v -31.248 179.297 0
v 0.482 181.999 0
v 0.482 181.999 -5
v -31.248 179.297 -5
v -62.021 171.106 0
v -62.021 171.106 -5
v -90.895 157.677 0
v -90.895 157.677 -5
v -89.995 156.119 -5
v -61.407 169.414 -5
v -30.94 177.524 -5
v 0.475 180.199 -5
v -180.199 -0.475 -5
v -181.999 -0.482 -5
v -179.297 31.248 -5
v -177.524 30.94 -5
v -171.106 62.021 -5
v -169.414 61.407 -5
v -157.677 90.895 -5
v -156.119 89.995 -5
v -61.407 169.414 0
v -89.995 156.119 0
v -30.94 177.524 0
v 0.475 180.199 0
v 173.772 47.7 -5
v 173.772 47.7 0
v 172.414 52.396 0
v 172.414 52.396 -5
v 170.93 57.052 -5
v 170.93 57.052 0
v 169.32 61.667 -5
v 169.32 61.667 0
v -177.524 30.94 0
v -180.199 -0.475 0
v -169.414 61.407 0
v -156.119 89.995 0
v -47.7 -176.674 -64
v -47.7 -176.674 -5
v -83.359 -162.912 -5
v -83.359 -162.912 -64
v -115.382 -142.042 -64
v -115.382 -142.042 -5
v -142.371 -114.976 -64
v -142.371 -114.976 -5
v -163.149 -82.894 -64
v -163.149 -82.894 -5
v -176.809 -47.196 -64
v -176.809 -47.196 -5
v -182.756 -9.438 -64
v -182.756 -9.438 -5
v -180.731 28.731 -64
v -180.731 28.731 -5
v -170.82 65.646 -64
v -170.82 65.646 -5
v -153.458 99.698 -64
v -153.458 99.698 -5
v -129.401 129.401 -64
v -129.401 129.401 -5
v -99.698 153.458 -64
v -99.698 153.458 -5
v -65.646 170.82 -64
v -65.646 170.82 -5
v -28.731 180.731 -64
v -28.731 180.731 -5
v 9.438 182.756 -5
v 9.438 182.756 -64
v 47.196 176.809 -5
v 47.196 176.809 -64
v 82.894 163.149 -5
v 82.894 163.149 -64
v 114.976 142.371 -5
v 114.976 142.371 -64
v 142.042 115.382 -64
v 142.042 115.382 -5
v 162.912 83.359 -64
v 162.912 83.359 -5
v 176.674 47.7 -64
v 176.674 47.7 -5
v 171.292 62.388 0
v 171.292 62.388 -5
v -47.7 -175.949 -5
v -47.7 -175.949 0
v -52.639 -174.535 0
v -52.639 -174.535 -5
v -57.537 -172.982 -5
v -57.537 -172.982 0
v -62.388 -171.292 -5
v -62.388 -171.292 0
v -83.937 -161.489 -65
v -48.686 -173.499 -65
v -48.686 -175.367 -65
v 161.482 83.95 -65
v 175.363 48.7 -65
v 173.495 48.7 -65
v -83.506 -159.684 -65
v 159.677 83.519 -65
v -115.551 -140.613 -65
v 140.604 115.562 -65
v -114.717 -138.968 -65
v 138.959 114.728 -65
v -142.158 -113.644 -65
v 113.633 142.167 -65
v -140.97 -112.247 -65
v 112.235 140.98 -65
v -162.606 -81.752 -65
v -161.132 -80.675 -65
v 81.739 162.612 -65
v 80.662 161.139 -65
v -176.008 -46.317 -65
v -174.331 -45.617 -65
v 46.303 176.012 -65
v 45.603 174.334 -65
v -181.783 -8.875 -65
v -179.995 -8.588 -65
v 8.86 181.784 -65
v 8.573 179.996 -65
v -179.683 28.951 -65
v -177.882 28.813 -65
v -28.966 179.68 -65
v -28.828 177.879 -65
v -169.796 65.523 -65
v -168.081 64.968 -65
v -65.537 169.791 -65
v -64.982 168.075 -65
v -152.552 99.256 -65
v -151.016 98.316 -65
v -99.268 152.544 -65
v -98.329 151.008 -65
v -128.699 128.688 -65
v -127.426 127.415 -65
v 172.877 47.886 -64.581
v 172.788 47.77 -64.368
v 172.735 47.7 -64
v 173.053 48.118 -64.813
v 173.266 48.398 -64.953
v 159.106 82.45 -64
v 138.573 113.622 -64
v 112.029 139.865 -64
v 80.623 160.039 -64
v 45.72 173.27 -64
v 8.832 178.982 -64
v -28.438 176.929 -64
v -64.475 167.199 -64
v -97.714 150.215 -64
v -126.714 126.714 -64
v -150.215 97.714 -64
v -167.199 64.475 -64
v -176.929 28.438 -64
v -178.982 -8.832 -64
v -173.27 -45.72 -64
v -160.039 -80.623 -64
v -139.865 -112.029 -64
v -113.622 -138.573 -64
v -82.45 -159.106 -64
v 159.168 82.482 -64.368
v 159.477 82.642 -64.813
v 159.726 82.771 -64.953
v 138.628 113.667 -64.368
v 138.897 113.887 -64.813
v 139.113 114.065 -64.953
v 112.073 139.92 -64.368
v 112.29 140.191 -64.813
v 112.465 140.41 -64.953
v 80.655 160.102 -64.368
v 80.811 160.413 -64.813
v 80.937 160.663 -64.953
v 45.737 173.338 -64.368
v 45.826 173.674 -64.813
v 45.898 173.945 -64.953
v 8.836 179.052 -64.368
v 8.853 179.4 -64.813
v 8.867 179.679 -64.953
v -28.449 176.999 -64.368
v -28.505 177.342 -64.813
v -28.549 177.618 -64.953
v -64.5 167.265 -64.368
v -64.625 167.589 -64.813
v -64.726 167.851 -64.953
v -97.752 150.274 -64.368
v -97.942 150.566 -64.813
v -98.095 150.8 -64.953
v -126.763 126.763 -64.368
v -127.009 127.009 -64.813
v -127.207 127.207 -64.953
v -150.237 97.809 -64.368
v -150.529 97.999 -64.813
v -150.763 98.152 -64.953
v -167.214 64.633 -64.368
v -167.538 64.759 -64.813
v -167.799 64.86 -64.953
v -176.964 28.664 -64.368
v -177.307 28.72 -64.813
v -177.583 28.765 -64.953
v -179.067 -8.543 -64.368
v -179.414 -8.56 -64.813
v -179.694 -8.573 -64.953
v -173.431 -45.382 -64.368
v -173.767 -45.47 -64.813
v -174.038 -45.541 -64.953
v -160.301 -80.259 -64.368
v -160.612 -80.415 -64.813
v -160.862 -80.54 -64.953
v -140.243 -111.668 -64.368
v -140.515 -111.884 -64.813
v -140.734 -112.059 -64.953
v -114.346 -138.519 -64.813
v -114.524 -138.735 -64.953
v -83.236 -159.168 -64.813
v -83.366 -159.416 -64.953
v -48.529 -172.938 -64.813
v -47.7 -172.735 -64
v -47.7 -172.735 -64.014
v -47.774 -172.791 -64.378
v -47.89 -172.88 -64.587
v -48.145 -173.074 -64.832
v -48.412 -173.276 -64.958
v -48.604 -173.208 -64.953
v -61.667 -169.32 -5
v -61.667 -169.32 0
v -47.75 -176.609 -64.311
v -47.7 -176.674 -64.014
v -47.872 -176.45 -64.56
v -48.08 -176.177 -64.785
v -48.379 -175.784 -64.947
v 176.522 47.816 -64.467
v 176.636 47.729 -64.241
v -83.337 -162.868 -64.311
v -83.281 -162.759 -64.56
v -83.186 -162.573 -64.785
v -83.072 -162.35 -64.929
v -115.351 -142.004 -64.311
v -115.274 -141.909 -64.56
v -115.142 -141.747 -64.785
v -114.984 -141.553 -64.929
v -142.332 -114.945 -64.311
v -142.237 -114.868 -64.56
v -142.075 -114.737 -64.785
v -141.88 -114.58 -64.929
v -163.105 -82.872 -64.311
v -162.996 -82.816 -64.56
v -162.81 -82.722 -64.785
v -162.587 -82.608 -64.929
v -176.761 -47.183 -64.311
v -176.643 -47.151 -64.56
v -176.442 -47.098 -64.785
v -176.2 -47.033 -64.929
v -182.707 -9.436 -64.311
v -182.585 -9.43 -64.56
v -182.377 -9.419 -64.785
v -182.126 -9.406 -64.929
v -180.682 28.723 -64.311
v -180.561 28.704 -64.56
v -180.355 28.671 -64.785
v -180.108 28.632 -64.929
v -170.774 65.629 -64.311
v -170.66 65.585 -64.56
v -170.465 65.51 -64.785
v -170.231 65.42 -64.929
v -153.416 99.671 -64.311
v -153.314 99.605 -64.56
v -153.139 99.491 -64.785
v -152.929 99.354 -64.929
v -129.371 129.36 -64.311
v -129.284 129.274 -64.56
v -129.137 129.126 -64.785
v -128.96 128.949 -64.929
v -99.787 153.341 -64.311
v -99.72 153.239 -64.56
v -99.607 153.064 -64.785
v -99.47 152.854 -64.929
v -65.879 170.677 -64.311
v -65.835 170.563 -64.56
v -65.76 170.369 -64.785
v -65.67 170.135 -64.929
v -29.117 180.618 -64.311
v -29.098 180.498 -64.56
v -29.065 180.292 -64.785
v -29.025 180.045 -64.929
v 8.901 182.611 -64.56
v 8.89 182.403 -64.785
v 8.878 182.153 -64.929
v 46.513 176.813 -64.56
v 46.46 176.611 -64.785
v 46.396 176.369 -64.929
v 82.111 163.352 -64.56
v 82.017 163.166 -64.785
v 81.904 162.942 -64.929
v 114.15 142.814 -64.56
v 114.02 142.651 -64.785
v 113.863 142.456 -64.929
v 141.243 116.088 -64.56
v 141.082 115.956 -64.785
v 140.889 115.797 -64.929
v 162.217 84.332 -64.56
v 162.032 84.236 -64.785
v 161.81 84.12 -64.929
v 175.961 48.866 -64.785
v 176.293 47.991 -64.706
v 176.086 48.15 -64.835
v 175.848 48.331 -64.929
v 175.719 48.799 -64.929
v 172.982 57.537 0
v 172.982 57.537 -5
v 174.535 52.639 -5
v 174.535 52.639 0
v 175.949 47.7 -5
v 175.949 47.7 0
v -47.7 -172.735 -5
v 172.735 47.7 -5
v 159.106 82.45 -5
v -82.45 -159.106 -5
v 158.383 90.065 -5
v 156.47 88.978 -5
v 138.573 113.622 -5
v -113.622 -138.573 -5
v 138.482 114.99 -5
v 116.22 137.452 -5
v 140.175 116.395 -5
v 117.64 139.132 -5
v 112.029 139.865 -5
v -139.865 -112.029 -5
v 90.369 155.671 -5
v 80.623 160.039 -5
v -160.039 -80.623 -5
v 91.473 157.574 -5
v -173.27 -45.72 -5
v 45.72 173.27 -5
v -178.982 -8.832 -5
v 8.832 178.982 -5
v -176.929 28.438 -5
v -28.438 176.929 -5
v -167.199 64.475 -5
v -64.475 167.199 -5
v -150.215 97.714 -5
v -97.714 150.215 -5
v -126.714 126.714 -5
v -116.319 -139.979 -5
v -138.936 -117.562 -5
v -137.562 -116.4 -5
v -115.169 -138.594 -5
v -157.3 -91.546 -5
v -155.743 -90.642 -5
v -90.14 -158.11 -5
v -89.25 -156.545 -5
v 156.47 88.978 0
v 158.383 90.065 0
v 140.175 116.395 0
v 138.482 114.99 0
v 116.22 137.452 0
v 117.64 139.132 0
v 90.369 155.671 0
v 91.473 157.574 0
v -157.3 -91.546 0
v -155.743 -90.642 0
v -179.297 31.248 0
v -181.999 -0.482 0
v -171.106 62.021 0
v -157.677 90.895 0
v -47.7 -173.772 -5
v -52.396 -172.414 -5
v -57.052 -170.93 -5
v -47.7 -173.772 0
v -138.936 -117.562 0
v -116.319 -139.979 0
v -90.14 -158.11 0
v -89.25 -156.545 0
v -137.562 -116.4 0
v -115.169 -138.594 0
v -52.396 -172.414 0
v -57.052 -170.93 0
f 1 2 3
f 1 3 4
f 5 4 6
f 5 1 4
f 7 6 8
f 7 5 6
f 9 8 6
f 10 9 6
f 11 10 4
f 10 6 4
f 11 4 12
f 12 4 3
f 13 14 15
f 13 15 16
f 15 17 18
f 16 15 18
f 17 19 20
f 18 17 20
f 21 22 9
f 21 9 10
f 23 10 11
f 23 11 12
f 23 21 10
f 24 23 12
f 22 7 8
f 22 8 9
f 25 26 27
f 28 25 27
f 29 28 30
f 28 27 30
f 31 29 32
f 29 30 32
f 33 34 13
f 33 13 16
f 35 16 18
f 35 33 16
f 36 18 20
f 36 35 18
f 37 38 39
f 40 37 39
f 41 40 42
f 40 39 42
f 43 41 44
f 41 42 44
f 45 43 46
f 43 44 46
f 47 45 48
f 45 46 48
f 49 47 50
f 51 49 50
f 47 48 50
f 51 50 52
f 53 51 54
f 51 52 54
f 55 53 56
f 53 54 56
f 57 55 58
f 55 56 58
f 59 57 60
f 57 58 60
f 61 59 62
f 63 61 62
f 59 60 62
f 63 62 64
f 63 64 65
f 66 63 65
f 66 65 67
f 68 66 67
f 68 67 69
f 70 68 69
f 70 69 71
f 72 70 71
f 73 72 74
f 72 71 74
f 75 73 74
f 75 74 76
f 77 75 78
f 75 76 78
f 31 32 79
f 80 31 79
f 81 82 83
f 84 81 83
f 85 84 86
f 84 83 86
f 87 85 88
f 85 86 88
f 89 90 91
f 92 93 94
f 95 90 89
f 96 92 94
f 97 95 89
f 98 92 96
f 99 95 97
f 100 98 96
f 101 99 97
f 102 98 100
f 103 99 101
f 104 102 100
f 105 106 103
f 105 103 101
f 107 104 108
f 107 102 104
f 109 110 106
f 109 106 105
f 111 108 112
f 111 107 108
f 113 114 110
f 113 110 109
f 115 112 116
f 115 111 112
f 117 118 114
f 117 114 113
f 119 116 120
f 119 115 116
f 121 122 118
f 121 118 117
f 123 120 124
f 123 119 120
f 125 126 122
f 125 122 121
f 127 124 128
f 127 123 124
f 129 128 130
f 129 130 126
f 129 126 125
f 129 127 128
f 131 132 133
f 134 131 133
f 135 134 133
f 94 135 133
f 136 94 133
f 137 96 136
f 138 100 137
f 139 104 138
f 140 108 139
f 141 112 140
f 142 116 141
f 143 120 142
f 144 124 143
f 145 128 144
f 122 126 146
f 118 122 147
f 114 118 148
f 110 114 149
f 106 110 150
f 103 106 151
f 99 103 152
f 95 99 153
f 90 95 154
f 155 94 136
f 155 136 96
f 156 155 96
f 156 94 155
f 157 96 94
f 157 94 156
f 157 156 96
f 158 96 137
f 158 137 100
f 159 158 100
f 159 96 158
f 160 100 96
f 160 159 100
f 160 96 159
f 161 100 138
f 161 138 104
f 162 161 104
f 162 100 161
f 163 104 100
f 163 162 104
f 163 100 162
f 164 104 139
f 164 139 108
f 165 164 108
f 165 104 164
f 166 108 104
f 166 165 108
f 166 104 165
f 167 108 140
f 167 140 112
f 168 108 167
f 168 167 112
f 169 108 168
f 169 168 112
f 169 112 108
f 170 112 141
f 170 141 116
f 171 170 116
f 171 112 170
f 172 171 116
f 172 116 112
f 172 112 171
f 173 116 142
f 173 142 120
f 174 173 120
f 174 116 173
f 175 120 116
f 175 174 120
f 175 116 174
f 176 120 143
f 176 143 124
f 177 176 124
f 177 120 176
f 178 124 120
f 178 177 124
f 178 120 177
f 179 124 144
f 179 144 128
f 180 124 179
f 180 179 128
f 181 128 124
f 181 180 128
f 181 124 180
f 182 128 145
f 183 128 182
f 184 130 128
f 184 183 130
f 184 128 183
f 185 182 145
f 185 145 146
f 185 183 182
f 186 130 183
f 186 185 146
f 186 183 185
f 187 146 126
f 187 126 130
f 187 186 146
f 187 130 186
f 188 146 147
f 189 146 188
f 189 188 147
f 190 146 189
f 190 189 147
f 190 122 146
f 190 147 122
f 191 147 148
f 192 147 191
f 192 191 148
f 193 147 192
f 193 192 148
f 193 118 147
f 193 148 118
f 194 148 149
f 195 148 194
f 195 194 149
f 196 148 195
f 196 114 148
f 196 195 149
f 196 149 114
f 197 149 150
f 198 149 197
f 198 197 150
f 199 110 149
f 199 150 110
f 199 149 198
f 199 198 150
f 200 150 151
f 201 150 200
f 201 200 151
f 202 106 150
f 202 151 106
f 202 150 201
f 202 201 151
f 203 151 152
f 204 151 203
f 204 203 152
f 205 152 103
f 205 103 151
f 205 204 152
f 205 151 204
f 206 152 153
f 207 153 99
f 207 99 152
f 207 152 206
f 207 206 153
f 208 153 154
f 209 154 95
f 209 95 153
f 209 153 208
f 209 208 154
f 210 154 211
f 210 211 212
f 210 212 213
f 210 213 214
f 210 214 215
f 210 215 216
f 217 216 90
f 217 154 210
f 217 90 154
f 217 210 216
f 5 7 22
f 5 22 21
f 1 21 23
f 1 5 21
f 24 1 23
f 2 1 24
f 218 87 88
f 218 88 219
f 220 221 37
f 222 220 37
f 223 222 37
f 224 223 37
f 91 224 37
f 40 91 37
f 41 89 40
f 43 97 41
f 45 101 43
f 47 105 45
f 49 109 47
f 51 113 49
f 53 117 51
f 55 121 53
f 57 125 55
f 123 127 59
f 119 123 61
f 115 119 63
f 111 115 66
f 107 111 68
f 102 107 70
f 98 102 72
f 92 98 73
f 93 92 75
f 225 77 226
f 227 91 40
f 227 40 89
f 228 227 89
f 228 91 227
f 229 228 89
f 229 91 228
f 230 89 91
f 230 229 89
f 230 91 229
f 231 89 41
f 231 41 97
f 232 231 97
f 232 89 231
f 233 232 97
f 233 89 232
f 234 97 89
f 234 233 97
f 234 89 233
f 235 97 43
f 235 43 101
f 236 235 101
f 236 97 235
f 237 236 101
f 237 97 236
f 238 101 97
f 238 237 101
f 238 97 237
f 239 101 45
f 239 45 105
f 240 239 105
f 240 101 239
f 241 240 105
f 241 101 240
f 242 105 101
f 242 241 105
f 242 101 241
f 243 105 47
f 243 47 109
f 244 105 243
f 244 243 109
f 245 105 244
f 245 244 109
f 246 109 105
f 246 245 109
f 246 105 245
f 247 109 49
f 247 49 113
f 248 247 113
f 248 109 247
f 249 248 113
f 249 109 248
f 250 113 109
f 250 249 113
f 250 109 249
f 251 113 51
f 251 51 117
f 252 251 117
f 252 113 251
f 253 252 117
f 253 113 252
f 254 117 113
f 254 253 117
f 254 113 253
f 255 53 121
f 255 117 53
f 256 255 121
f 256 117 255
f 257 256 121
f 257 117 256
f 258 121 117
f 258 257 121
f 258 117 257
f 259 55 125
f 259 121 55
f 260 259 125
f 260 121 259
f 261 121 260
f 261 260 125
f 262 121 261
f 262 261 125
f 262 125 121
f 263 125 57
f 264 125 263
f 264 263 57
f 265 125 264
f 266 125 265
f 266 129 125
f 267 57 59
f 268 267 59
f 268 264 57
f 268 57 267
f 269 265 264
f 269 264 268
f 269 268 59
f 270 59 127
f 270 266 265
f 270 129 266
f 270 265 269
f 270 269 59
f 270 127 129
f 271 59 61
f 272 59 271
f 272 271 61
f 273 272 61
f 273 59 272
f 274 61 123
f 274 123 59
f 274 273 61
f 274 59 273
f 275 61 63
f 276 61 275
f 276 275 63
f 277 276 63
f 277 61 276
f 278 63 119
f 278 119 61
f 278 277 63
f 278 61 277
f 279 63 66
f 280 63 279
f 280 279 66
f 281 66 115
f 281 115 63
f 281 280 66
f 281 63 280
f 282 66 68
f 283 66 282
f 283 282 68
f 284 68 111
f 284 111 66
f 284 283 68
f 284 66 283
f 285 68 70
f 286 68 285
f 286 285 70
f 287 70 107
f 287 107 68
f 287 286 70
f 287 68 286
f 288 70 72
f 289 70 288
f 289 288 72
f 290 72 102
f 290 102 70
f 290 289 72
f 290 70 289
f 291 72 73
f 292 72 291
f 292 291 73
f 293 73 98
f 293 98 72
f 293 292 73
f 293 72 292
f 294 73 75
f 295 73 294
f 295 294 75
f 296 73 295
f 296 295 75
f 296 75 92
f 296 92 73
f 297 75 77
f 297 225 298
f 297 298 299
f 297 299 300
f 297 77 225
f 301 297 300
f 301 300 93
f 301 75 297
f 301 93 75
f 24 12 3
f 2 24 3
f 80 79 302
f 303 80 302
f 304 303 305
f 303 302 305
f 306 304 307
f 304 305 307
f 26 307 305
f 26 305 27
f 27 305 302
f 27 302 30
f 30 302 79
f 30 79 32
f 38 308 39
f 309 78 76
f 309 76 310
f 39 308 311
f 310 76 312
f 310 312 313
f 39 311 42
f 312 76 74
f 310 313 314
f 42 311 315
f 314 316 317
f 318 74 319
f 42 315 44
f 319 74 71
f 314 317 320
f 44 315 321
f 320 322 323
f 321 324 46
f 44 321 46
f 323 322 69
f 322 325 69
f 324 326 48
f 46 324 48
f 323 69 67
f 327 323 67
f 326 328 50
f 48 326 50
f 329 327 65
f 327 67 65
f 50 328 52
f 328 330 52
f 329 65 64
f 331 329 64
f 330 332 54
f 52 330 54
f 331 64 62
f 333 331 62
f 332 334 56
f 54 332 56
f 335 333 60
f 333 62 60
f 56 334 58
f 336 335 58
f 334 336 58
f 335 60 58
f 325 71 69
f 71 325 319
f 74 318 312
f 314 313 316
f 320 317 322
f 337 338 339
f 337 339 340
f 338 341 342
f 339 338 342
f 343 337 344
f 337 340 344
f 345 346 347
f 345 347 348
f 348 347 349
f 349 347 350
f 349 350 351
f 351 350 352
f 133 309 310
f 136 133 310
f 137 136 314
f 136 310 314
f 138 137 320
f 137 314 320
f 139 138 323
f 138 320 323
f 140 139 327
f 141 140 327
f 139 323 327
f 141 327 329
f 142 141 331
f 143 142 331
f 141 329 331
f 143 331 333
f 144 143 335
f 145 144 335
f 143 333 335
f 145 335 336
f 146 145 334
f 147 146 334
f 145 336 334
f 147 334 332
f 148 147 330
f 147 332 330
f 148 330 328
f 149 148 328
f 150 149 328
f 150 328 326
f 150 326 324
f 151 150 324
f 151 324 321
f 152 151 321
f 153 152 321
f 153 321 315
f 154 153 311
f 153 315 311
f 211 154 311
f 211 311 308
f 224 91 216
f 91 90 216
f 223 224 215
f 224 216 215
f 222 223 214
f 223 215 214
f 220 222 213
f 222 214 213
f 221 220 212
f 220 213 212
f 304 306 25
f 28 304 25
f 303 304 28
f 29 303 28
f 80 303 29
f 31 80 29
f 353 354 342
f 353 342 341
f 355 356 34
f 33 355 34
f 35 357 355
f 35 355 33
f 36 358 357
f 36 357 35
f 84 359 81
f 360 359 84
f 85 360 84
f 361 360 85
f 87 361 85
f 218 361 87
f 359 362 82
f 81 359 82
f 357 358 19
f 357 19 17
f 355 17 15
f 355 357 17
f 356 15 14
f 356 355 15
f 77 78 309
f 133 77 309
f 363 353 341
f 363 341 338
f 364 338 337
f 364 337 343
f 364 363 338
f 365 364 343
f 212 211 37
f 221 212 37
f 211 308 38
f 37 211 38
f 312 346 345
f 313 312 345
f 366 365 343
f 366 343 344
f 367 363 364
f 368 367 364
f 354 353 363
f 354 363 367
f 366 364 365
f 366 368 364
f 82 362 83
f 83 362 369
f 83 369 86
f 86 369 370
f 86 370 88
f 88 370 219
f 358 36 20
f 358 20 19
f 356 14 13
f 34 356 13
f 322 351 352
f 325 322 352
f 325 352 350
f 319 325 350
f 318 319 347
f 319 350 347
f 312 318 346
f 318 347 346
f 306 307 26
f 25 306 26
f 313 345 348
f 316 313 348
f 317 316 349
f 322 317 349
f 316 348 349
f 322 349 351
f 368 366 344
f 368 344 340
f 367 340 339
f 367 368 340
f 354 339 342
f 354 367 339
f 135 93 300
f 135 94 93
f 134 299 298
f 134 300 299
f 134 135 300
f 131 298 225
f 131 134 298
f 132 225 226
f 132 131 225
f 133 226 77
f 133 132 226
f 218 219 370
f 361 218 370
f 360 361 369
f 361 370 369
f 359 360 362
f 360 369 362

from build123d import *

# Parameters (mm, degrees)
BOSS_EXTRUDE1_DEPTH   = 5
BOSS_EXTRUDE1_2_DEPTH = 5
BOSS_EXTRUDE1_3_DEPTH = 5
BOSS_EXTRUDE1_4_DEPTH = 5
BOSS_EXTRUDE1_5_DEPTH = 5
BOSS_EXTRUDE1_6_DEPTH = 5
BOSS_EXTRUDE2_DEPTH   = 60
FILLET1_R             = 1
FILLET2_R             = 1


with BuildPart() as part:
    # Sketch1 → Boss-Extrude1 (new body)
    with BuildSketch(Plane.XY):
        with BuildLine():
            Line((158.382872448, 90.065008273), (156.470455766, 88.977505429))
            ThreePointArc((156.470455766, 88.977505429), (127.845298599, 126.710613707), (90.368878394, 155.671017912))
            Line((90.368878394, 155.671017912), (91.473386907, 157.573663687))
            ThreePointArc((91.473386907, 157.573663687), (129.407852249, 128.259298986), (158.382872448, 90.065008273))
        make_face()
    extrude(amount=-BOSS_EXTRUDE1_DEPTH)

    # Sketch2 → Boss-Extrude2 (add)
    with BuildSketch(Plane(origin=(0, 0, -5), x_dir=(-1, 0, 0), z_dir=(0, 0, -1))):
        with BuildLine():
            Line((47.7, -172.73491251), (47.7, -176.674021859))
            ThreePointArc((47.7, -176.674021859), (129.400540957, 129.400540957), (-176.674021859, 47.7))
            Line((-176.674021859, 47.7), (-172.73491251, 47.7))
            ThreePointArc((-172.73491251, 47.7), (126.713535189, 126.713535189), (47.7, -172.73491251))
        make_face()
    extrude(amount=BOSS_EXTRUDE2_DEPTH)

    # Fillet1
    fillet1_edges = [part.edges().sort_by_distance(p)[0] for p in [
        (-126.713535189, 126.713535189, -65),
        (-129.400540957, 129.400540957, -65),
        (174.704467185, 47.7, -65),
    ]]
    fillet(fillet1_edges, radius=FILLET1_R)

    # Fillet2
    # the kernel refuses this fillet: 1 mm, written as the material it takes off along each edge
    with BuildSketch(Plane(origin=(-47.7, -171.272370881, -65), x_dir=(0.0001000100005032703, 0, 0.9999999949989999), z_dir=(0, -1, 0))) as fillet2_piece_1:
        with BuildLine():
            CenterArc((0.999799995, 0.999999995), FILLET2_R, 180.005730151, 90)
            Line((-0.0002, 0.999899985), (-0.0202, 0.999897985))
            ThreePointArc((-0.0202, 0.999897985), (-0.02005, 0.499947997), (-0.02, -2e-06))
            Line((-0.02, -2e-06), (2e-06, -0.02))
            ThreePointArc((2e-06, -0.02), (0.499951998, -0.01995), (0.999902005, -0.02))
            Line((0.999902005, -0.02), (0.999900005, 0))
        make_face()
    extrude(amount=6.865387546, mode=Mode.SUBTRACT)


with BuildPart() as body_2:
    # Sketch1 → Boss-Extrude1 2 (new body)
    with BuildSketch(Plane.XY):
        with BuildLine():
            Line((169.319700725, 61.667486946), (171.292107151, 62.388332466))
            ThreePointArc((171.292107151, 62.388332466), (173.775741793, 55.093389478), (175.948856205, 47.7))
            Line((175.948856205, 47.7), (173.772120894, 47.7))
            ThreePointArc((173.772120894, 47.7), (171.688008284, 54.729039929), (169.319700725, 61.667486946))
        make_face()
    extrude(amount=-BOSS_EXTRUDE1_2_DEPTH)


with BuildPart() as body_3:
    # Sketch1 → Boss-Extrude1 3 (new body)
    with BuildSketch(Plane.XY):
        with BuildLine():
            Line((-90.895254799, 157.67705177), (-89.99457706, 156.118596265))
            ThreePointArc((-89.99457706, 156.118596265), (-46.351054078, 174.136784701), (0.474763766, 180.199374581))
            Line((0.474763766, 180.199374581), (0.481503909, 181.999363059))
            ThreePointArc((0.481503909, 181.999363059), (-46.814050179, 175.876219842), (-90.895254799, 157.67705177))
        make_face()
    extrude(amount=-BOSS_EXTRUDE1_3_DEPTH)


with BuildPart() as body_4:
    # Sketch1 → Boss-Extrude1 4 (new body)
    with BuildSketch(Plane.XY):
        with BuildLine():
            Line((-181.999363059, -0.481503909), (-180.199374581, -0.474763766))
            ThreePointArc((-180.199374581, -0.474763766), (-174.136784701, 46.351054078), (-156.118596265, 89.99457706))
            Line((-156.118596265, 89.99457706), (-157.67705177, 90.895254799))
            ThreePointArc((-157.67705177, 90.895254799), (-175.876219842, 46.814050179), (-181.999363059, -0.481503909))
        make_face()
    extrude(amount=-BOSS_EXTRUDE1_4_DEPTH)


with BuildPart() as body_5:
    # Sketch1 → Boss-Extrude1 5 (new body)
    with BuildSketch(Plane.XY):
        with BuildLine():
            Line((-90.139946119, -158.110056965), (-89.250170522, -156.545351454))
            ThreePointArc((-89.250170522, -156.545351454), (-126.851403278, -127.987348931), (-155.743479859, -90.642200335))
            Line((-155.743479859, -90.642200335), (-157.300190987, -91.54588967))
            ThreePointArc((-157.300190987, -91.54588967), (-128.118509415, -129.265801917), (-90.139946119, -158.110056965))
        make_face()
    extrude(amount=-BOSS_EXTRUDE1_5_DEPTH)


with BuildPart() as body_6:
    # Sketch1 → Boss-Extrude1 6 (new body)
    with BuildSketch(Plane.XY):
        with BuildLine():
            Line((-47.7, -173.772120894), (-47.7, -175.948856205))
            ThreePointArc((-47.7, -175.948856205), (-55.093389478, -173.775741793), (-62.388332466, -171.292107151))
            Line((-62.388332466, -171.292107151), (-61.667486946, -169.319700725))
            ThreePointArc((-61.667486946, -169.319700725), (-54.729039929, -171.688008284), (-47.7, -173.772120894))
        make_face()
    extrude(amount=-BOSS_EXTRUDE1_6_DEPTH)


solid = Compound([part.part, body_2.part, body_3.part, body_4.part, body_5.part, body_6.part])
